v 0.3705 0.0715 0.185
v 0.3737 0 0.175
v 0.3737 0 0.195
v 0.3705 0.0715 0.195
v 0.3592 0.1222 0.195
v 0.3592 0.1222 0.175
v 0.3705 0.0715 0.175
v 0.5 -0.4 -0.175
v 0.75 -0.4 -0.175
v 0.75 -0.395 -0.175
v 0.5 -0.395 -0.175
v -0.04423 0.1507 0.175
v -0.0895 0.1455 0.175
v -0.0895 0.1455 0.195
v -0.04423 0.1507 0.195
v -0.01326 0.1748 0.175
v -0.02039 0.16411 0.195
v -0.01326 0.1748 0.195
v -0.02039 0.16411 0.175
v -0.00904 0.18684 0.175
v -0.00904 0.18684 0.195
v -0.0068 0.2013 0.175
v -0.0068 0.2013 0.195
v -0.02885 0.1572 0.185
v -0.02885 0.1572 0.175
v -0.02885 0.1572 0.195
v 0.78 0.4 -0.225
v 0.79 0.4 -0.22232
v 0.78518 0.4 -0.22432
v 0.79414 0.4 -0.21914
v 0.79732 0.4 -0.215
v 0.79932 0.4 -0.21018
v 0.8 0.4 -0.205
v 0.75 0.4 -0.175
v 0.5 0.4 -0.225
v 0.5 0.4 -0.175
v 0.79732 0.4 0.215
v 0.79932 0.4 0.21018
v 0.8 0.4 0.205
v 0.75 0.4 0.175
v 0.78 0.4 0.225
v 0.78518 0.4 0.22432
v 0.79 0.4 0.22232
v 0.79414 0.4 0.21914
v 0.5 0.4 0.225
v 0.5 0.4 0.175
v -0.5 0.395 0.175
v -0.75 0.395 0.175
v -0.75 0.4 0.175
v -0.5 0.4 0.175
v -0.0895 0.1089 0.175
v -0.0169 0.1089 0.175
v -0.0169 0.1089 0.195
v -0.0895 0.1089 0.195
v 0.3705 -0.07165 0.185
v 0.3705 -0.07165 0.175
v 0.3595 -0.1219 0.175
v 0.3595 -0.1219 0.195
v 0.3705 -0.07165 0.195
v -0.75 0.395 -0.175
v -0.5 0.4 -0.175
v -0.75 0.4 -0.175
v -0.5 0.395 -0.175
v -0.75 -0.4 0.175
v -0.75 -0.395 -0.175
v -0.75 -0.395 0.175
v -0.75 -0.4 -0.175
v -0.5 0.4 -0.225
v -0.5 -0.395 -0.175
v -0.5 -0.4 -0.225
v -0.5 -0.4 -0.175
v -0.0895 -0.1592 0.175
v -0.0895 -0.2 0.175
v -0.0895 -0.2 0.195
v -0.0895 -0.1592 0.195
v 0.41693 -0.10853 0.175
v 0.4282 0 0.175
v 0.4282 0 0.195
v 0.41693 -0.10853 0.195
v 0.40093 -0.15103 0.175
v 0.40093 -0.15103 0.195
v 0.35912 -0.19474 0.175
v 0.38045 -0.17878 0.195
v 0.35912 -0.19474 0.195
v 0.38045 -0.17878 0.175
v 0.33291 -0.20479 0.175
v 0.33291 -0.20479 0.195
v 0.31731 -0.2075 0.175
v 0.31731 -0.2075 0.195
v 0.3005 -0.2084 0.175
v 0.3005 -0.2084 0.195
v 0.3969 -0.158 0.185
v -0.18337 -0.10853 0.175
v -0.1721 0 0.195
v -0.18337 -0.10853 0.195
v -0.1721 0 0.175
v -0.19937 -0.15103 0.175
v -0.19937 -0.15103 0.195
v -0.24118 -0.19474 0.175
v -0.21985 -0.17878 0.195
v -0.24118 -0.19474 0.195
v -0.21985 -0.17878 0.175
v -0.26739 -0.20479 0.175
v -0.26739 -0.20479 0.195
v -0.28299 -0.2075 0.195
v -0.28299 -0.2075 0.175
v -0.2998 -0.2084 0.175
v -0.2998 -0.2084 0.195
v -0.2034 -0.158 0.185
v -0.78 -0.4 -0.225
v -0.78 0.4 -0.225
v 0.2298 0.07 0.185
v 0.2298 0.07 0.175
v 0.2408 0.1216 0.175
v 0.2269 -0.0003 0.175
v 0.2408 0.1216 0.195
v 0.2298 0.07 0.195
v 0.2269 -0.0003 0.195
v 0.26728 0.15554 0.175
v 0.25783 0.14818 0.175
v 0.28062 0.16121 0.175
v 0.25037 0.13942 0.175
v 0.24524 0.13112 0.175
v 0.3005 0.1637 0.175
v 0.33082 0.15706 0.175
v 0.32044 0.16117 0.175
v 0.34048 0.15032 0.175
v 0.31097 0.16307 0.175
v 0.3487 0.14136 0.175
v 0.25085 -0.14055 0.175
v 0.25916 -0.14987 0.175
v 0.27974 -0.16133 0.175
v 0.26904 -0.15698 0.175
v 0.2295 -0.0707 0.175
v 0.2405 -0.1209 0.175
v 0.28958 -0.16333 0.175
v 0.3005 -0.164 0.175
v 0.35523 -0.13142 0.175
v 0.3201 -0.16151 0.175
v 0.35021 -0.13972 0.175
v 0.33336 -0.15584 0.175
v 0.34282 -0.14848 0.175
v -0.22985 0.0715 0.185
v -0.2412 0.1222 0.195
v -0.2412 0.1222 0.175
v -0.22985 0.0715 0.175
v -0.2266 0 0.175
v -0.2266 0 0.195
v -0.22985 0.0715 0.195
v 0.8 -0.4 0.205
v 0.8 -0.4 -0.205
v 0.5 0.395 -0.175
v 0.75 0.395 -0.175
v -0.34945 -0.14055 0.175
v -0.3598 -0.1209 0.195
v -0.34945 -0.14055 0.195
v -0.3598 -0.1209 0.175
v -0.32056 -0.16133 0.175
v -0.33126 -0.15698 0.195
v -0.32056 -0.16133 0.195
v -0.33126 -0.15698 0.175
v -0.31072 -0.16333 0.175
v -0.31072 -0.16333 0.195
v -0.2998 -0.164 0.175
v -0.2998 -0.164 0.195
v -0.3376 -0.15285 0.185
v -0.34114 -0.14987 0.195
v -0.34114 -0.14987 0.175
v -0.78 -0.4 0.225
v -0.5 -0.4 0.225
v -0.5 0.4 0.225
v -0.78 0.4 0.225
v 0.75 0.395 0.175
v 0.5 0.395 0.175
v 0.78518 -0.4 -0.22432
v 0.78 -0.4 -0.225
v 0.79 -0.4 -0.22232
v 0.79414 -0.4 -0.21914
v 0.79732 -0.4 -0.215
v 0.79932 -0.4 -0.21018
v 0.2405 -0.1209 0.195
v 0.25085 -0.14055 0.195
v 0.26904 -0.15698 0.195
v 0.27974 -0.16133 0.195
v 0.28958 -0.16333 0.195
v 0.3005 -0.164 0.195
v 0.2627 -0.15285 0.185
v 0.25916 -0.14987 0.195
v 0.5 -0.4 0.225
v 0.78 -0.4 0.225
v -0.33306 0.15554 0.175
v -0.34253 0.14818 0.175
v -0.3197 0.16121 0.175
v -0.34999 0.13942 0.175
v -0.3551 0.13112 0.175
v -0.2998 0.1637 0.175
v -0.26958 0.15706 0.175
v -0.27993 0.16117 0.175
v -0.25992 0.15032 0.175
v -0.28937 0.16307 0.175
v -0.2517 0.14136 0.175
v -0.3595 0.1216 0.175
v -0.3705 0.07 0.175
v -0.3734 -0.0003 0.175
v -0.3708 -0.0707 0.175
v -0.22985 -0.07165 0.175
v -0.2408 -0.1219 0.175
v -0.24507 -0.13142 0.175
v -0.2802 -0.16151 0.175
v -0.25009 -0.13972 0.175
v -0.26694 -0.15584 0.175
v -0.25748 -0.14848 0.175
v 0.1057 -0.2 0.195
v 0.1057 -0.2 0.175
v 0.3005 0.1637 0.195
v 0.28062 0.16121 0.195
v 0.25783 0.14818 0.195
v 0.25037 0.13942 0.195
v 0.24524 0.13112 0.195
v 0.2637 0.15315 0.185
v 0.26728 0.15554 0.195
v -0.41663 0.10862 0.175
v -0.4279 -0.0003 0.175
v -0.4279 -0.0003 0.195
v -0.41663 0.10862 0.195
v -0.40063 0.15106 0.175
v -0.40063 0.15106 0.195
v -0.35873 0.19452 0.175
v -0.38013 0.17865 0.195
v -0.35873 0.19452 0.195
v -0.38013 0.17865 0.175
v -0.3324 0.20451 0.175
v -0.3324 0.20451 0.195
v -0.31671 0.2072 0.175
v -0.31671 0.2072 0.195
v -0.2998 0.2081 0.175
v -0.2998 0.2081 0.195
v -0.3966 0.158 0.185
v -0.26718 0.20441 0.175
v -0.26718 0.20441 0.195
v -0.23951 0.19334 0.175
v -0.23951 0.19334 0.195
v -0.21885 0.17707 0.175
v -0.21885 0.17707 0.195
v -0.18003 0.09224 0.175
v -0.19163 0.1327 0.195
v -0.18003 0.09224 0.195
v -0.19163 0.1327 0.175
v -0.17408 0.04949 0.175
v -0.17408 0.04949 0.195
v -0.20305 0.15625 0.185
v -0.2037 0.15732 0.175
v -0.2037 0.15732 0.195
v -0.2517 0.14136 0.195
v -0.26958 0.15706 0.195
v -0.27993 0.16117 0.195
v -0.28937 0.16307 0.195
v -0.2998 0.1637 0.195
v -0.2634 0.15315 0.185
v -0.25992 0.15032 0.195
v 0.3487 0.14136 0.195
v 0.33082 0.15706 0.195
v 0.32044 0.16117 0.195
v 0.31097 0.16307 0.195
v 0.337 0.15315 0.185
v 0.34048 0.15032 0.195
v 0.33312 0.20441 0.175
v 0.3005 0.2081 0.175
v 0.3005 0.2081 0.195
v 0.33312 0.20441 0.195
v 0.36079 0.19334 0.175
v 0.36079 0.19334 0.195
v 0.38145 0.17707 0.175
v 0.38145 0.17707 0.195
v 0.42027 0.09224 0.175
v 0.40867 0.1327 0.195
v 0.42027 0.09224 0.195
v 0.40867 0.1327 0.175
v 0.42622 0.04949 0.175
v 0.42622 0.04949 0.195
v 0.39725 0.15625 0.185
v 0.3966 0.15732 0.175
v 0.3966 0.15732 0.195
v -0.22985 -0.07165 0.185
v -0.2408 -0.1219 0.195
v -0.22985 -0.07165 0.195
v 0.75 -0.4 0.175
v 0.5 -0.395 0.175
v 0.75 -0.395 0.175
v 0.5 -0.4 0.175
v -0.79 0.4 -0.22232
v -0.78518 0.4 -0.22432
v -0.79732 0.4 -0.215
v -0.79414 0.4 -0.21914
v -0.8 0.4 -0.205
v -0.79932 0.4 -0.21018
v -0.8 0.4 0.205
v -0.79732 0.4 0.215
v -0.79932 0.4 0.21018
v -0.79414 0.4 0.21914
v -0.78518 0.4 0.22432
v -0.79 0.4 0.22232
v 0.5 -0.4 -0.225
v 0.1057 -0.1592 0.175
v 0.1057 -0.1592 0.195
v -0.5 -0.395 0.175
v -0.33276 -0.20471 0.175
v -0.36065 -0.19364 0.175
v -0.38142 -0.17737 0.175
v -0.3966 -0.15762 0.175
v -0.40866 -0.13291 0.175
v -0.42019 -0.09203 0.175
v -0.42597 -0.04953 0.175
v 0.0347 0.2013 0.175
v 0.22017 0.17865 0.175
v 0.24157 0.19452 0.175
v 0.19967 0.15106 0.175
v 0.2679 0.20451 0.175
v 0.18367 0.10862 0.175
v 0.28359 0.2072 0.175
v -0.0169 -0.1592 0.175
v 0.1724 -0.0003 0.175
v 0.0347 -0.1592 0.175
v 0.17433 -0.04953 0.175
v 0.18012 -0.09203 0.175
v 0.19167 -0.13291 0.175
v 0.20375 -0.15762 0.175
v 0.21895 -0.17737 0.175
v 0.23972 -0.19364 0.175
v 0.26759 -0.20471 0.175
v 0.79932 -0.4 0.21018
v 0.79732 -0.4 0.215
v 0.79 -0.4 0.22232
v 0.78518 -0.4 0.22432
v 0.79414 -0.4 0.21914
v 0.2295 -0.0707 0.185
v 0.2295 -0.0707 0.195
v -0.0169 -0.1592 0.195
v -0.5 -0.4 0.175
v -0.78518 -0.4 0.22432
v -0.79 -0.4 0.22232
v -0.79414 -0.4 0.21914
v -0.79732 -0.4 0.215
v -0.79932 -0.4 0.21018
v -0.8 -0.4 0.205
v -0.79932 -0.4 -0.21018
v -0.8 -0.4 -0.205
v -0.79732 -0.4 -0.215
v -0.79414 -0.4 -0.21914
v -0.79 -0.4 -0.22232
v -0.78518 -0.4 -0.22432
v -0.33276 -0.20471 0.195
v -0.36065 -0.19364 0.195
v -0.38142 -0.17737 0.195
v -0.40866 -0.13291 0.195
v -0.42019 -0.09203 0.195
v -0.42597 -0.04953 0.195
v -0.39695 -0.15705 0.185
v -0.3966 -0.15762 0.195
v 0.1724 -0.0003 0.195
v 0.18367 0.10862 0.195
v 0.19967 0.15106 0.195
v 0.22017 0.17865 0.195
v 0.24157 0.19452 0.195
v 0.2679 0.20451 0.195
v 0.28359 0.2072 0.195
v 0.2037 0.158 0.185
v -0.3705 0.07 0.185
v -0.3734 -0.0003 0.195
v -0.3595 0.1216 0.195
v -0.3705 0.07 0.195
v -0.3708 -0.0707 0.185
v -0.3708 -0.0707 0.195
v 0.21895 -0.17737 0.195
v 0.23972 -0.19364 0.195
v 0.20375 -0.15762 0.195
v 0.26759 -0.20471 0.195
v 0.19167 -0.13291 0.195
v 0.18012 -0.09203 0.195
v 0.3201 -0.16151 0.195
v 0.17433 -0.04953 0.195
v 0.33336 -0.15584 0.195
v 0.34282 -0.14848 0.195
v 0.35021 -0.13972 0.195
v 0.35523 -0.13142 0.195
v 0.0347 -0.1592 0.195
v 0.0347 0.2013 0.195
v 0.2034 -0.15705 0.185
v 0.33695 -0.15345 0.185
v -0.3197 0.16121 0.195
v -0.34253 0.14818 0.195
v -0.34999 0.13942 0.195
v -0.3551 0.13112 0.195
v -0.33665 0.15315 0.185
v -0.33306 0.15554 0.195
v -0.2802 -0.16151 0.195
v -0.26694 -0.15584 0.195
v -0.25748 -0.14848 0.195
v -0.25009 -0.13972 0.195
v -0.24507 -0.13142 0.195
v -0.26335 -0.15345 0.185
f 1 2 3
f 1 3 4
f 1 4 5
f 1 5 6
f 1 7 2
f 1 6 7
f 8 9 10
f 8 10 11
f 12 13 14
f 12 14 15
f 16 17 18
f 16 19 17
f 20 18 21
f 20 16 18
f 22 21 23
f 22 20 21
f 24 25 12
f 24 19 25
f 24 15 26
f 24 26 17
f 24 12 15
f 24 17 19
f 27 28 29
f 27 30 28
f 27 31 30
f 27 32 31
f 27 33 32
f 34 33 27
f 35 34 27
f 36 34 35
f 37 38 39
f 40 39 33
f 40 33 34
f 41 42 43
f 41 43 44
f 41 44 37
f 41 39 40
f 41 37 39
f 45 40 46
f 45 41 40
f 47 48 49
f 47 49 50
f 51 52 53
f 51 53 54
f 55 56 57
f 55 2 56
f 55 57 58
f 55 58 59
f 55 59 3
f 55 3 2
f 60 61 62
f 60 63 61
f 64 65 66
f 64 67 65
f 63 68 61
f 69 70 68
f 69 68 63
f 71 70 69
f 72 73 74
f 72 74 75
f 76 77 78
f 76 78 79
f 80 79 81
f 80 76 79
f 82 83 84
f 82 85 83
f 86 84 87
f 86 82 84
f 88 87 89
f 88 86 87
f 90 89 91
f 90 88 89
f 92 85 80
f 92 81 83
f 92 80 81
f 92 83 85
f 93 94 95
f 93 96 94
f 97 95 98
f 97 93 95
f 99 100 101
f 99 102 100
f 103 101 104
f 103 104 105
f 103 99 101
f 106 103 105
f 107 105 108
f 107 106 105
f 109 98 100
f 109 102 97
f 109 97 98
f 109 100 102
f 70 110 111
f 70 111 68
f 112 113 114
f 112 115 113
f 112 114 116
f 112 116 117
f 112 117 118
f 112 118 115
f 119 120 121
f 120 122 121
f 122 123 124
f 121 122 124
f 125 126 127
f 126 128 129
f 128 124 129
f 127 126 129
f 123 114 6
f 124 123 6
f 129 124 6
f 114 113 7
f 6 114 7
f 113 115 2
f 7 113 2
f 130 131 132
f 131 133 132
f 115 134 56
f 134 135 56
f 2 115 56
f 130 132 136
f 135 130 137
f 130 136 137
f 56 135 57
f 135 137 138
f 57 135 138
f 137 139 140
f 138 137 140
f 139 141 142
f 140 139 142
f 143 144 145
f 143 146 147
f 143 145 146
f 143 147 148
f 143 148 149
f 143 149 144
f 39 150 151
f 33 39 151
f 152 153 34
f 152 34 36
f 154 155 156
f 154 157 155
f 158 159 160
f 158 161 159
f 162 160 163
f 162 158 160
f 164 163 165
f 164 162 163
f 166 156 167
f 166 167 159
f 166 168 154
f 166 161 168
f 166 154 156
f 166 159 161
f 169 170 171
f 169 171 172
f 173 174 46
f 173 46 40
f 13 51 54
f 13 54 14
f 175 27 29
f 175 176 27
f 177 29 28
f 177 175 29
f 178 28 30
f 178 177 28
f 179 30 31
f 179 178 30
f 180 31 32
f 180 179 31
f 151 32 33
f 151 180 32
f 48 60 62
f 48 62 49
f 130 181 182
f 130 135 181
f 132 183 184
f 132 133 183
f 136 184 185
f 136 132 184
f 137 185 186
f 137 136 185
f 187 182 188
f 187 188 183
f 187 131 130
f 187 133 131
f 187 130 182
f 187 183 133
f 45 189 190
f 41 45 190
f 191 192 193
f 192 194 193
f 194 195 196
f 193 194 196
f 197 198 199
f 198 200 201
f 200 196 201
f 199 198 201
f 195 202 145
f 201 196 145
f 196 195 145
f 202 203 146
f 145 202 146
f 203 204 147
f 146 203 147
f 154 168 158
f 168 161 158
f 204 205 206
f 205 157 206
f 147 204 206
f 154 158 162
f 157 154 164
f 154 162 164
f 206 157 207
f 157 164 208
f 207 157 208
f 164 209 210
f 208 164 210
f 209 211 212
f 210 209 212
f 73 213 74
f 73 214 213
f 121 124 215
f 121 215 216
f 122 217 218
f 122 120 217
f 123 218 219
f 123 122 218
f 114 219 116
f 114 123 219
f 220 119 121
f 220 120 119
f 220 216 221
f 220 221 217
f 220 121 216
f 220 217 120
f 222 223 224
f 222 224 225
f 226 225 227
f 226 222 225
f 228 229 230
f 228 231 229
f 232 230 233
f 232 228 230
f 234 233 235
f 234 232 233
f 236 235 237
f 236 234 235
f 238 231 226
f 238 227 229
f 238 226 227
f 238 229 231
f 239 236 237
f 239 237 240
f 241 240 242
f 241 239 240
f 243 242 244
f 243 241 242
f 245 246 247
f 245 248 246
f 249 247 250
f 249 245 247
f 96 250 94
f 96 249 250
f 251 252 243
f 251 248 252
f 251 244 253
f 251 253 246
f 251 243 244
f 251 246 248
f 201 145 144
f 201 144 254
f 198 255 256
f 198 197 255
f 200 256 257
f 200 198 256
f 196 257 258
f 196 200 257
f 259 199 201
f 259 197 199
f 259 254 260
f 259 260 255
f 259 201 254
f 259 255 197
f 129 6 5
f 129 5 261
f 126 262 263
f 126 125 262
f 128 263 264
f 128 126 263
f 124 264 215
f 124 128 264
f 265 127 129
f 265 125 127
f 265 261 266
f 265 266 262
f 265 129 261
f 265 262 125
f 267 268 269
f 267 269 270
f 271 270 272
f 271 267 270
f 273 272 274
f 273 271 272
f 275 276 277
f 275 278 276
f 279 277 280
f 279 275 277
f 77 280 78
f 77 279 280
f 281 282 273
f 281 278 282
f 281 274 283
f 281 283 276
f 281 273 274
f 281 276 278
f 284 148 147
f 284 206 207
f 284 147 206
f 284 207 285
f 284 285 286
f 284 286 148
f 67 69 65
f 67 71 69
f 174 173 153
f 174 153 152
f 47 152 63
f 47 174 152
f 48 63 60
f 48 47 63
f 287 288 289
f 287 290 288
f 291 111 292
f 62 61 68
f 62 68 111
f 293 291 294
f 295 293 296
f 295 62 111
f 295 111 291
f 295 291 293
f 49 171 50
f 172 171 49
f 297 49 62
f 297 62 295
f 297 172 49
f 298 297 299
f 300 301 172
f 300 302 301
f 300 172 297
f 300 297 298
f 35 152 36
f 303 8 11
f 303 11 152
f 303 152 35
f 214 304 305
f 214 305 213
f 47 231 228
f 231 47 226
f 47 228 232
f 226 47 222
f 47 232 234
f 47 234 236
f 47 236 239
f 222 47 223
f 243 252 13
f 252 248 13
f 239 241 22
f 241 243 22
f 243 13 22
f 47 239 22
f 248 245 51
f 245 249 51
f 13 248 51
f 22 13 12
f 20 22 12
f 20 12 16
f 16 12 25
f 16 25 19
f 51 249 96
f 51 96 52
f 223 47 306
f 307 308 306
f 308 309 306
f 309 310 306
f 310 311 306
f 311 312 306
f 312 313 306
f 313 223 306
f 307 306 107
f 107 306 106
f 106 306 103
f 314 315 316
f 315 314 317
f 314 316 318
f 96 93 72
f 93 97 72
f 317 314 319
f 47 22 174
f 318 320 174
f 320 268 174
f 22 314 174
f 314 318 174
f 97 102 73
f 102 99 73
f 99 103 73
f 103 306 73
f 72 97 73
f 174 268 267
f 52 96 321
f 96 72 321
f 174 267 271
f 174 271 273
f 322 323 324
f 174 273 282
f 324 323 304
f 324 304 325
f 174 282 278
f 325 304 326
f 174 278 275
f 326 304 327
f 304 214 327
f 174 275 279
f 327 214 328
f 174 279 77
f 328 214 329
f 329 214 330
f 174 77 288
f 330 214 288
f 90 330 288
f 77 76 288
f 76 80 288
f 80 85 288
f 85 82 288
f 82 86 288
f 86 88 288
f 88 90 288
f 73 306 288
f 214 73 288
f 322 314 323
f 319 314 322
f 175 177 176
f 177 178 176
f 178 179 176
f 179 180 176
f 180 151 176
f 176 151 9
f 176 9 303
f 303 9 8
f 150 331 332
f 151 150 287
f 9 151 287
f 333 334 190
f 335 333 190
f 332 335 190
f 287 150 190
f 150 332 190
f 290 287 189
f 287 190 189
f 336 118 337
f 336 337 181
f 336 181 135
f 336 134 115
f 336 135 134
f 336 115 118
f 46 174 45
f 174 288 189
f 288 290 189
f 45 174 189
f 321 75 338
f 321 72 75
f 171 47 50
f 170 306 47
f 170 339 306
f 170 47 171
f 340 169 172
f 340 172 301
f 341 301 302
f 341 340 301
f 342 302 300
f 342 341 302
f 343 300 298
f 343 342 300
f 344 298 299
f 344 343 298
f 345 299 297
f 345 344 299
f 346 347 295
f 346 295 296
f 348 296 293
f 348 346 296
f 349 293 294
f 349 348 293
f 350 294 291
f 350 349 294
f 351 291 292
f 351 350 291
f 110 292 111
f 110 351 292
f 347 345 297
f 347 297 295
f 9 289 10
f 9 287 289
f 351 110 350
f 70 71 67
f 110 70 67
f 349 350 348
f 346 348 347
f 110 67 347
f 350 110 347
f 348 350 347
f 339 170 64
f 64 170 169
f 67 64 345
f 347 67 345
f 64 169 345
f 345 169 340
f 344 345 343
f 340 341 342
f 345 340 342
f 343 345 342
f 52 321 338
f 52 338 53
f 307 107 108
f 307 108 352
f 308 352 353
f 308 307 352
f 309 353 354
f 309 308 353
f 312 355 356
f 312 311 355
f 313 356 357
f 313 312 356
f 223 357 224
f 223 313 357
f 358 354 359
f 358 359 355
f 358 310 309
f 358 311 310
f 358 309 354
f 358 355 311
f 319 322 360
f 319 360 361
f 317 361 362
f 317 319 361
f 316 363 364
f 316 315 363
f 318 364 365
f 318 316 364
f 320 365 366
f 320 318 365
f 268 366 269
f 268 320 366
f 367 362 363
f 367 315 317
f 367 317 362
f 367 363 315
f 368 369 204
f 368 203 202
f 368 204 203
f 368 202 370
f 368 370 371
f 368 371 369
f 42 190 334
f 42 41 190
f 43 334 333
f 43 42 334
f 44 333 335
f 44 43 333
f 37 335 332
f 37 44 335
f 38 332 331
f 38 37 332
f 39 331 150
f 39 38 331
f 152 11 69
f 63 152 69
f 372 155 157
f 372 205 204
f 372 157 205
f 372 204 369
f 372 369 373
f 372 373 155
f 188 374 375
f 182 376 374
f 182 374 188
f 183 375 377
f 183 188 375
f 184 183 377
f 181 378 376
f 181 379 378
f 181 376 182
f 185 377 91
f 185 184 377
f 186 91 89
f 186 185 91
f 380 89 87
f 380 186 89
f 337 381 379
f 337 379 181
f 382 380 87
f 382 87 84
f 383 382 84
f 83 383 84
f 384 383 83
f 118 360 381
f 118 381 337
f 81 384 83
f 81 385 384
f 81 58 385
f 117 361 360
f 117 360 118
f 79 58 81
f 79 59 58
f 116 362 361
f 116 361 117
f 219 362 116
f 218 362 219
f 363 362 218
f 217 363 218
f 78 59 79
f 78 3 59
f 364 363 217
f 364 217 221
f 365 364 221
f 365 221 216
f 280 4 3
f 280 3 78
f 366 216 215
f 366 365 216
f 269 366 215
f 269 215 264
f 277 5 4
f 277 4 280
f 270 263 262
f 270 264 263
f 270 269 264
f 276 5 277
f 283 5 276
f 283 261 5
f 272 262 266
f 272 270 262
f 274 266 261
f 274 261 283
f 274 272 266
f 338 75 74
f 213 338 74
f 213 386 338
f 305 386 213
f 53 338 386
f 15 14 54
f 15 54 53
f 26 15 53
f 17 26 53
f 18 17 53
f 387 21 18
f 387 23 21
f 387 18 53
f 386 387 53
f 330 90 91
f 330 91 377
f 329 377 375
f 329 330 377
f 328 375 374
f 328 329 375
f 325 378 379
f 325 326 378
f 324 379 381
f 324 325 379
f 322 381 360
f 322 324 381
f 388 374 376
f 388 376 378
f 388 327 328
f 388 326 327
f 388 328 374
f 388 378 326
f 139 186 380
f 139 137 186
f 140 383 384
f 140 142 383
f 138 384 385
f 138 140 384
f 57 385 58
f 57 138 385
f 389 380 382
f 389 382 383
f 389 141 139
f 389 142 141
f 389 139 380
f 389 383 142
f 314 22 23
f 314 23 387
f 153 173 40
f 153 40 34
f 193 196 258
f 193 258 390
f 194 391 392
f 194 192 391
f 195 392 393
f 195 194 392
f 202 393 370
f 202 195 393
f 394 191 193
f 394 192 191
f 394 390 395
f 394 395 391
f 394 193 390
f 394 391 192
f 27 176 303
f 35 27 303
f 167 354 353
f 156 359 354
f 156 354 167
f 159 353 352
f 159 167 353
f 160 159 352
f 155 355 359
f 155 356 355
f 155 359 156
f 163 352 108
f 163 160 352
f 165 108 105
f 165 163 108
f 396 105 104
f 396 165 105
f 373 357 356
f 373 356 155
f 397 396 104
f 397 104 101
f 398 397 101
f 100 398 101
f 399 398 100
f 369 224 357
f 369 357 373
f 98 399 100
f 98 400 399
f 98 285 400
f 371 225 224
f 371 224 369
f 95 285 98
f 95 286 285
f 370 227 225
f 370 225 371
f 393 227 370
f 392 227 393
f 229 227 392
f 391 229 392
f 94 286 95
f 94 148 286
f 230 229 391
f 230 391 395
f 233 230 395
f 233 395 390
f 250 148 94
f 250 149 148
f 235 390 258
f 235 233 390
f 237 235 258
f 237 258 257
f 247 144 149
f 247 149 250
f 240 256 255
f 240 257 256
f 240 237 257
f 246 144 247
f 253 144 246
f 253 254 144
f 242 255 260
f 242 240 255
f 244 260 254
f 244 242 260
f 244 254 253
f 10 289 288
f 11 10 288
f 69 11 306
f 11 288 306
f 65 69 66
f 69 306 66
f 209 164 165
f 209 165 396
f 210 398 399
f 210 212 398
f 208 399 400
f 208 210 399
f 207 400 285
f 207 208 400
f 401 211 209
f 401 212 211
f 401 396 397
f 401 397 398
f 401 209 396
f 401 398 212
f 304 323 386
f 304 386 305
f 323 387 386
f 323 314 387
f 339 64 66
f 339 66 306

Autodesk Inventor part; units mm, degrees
ref_plane "YZ Plane" through (0, 0, 0) normal (1, 0, 0) x (0, 1, 0)
ref_plane "XZ Plane" through (0, 0, 0) normal (0, 1, 0) x (-1, 0, 0)
ref_plane "XY Plane" through (0, 0, 0) normal (0, 0, 1) x (1, 0, 0)
sketch "Sketch1" plane through (0, 0, 0) normal (0, 1, 0) x (-1, 0, 0)
  line L0 (0.75, 0.175) -> (-0.75, 0.175)
  line L1 (-0.75, 0.175) -> (-0.75, -0.175)
  line L2 (-0.75, -0.175) -> (0.75, -0.175)
  line L3 (0.75, -0.175) -> (0.75, 0.175)
  line L4 (0.5, 0.175) -> (0.5, 0.225)
  line L5 (0.5, 0.225) -> (0.8, 0.225)
  line L6 (0.8, 0.225) -> (0.8, -0.225)
  line L7 (0.8, -0.225) -> (0.5, -0.225)
  line L8 (0.5, -0.225) -> (0.5, -0.175)
  line L9 (-0.5, 0.175) -> (-0.5, 0.225)
  line L10 (-0.5, 0.225) -> (-0.8, 0.225)
  line L11 (-0.8, 0.225) -> (-0.8, -0.225)
  line L12 (-0.8, -0.225) -> (-0.5, -0.225)
  line L13 (-0.5, -0.175) -> (-0.5, -0.225)
  line L14 (0.5, 0.175) -> (-0.5, 0.175)
  point P0 (0, 0)
  point P1 (0, 0.175)
  point P2 (0.75, 0)
  dimension "d0" = 1.6
  dimension "d1" = 0.05
  dimension "d2" = 0.05
  dimension "d3" = 0.45
  dimension "d4" = 0.3
extrude "Extrusion1" add sketch "Sketch1" along normal mid plane 0.8 contours L0 L4 L5 L6 L7 L8 L2 L3 | L0 L1 L2 L13 L12 L11 L10 L9
extrude "Extrusion2" add sketch "Sketch1" along normal mid plane 0.79 contours L3 L2 L1 L0
sketch "Sketch2" plane through (-0.5, -0.395, 0.175) normal (0, 0, 1) x (1, 0, 0)
  line L0 (0, 0) -> (0, 0.79) projected
  line L1 (1, 0) -> (0, 0) projected
  line L2 (1, 0) -> (1, 0.79) projected
  line L3 (0, 0.79) -> (1, 0.79) projected
  line L4 (0, 0.395) -> (1, 0.395) construction
  spline S0 degree 2 poles (0.3279, 0.395) (0.3279, 0.2874) (0.2653, 0.1866) (0.2002, 0.1866) knots 0 0 0 1 2 2 2
  spline S1 degree 2 poles (0.2002, 0.1866) (0.134, 0.1866) (0.0721, 0.2893) (0.0721, 0.3947) knots 0 0 0 1 2 2 2
  spline S2 degree 2 poles (0.0721, 0.3947) (0.0721, 0.5029) (0.1347, 0.6031) (0.2002, 0.6031) knots 0 0 0 1 2 2 2
  spline S3 degree 2 poles (0.2002, 0.6031) (0.266, 0.6031) (0.3279, 0.4994) (0.3279, 0.395) knots 0 0 0 1 2 2 2
  spline S4 degree 2 poles (0.2592, 0.2731) (0.2669, 0.2929) (0.2734, 0.3538) (0.2734, 0.395) knots 0 0 0 1 2 2 2
  spline S5 degree 2 poles (0.2734, 0.395) (0.2734, 0.4362) (0.2669, 0.4968) (0.2588, 0.5172) knots 0 0 0 1 2 2 2
  spline S6 degree 2 poles (0.2588, 0.5172) (0.2507, 0.5376) (0.2225, 0.5587) (0.2002, 0.5587) knots 0 0 0 1 2 2 2
  spline S7 degree 2 poles (0.2002, 0.5587) (0.1778, 0.5587) (0.1489, 0.5376) (0.1405, 0.5166) knots 0 0 0 1 2 2 2
  spline S8 degree 2 poles (0.1405, 0.5166) (0.1324, 0.4961) (0.1266, 0.4339) (0.1266, 0.3947) knots 0 0 0 1 2 2 2
  spline S9 degree 2 poles (0.1266, 0.3947) (0.1266, 0.3525) (0.1318, 0.2961) (0.1402, 0.2741) knots 0 0 0 1 2 2 2
  spline S10 degree 2 poles (0.1402, 0.2741) (0.148, 0.2533) (0.1768, 0.231) (0.2002, 0.231) knots 0 0 0 1 2 2 2
  spline S11 degree 2 poles (0.2002, 0.231) (0.2222, 0.231) (0.2511, 0.2521) (0.2592, 0.2731) knots 0 0 0 1 2 2 2
  line L5 (0.6057, 0.195) -> (0.4105, 0.195)
  line L6 (0.4105, 0.195) -> (0.4105, 0.2358)
  line L7 (0.4105, 0.2358) -> (0.4831, 0.2358)
  line L8 (0.4831, 0.2358) -> (0.4831, 0.5039)
  line L9 (0.4831, 0.5039) -> (0.4105, 0.5039)
  line L10 (0.4105, 0.5039) -> (0.4105, 0.5405)
  spline S12 degree 2 poles (0.4105, 0.5405) (0.4517, 0.5405) (0.4906, 0.5639) (0.4932, 0.5963) knots 0 0 0 1 2 2 2
  line L11 (0.4932, 0.5963) -> (0.5347, 0.5963)
  line L12 (0.5347, 0.5963) -> (0.5347, 0.2358)
  line L13 (0.5347, 0.2358) -> (0.6057, 0.2358)
  line L14 (0.6057, 0.2358) -> (0.6057, 0.195)
  spline S13 degree 2 poles (0.9282, 0.395) (0.9282, 0.2874) (0.8656, 0.1866) (0.8005, 0.1866) knots 0 0 0 1 2 2 2
  spline S14 degree 2 poles (0.8005, 0.1866) (0.7344, 0.1866) (0.6724, 0.2893) (0.6724, 0.3947) knots 0 0 0 1 2 2 2
  spline S15 degree 2 poles (0.6724, 0.3947) (0.6724, 0.5029) (0.735, 0.6031) (0.8005, 0.6031) knots 0 0 0 1 2 2 2
  spline S16 degree 2 poles (0.8005, 0.6031) (0.8663, 0.6031) (0.9282, 0.4994) (0.9282, 0.395) knots 0 0 0 1 2 2 2
  spline S17 degree 2 poles (0.8595, 0.2731) (0.8673, 0.2929) (0.8737, 0.3538) (0.8737, 0.395) knots 0 0 0 1 2 2 2
  spline S18 degree 2 poles (0.8737, 0.395) (0.8737, 0.4362) (0.8673, 0.4968) (0.8592, 0.5172) knots 0 0 0 1 2 2 2
  spline S19 degree 2 poles (0.8592, 0.5172) (0.8511, 0.5376) (0.8229, 0.5587) (0.8005, 0.5587) knots 0 0 0 1 2 2 2
  spline S20 degree 2 poles (0.8005, 0.5587) (0.7781, 0.5587) (0.7493, 0.5376) (0.7408, 0.5166) knots 0 0 0 1 2 2 2
  spline S21 degree 2 poles (0.7408, 0.5166) (0.7327, 0.4961) (0.7269, 0.4339) (0.7269, 0.3947) knots 0 0 0 1 2 2 2
  spline S22 degree 2 poles (0.7269, 0.3947) (0.7269, 0.3525) (0.7321, 0.2961) (0.7405, 0.2741) knots 0 0 0 1 2 2 2
  spline S23 degree 2 poles (0.7405, 0.2741) (0.7483, 0.2533) (0.7771, 0.231) (0.8005, 0.231) knots 0 0 0 1 2 2 2
  spline S24 degree 2 poles (0.8005, 0.231) (0.8225, 0.231) (0.8514, 0.2521) (0.8595, 0.2731) knots 0 0 0 1 2 2 2
  point P0 (0.5, 0.395)
extrude "Extrusion3" add sketch "Sketch2" along normal blind 0.02 contours S0 S1 S2 S3 | L5 L6 L7 L8 L9 L10 S12 L11 L12 L13 L14 | S13 S14 S15 S16
fillet "Fillet1" radius 0.02 4 edges at (-0.8, 0, 0.225) (-0.8, 0, -0.225) (0.8, 0, 0.225) (0.8, 0, -0.225)
equation "\"d2\" = d1"
properties part number "21-1001" material "Copper"
